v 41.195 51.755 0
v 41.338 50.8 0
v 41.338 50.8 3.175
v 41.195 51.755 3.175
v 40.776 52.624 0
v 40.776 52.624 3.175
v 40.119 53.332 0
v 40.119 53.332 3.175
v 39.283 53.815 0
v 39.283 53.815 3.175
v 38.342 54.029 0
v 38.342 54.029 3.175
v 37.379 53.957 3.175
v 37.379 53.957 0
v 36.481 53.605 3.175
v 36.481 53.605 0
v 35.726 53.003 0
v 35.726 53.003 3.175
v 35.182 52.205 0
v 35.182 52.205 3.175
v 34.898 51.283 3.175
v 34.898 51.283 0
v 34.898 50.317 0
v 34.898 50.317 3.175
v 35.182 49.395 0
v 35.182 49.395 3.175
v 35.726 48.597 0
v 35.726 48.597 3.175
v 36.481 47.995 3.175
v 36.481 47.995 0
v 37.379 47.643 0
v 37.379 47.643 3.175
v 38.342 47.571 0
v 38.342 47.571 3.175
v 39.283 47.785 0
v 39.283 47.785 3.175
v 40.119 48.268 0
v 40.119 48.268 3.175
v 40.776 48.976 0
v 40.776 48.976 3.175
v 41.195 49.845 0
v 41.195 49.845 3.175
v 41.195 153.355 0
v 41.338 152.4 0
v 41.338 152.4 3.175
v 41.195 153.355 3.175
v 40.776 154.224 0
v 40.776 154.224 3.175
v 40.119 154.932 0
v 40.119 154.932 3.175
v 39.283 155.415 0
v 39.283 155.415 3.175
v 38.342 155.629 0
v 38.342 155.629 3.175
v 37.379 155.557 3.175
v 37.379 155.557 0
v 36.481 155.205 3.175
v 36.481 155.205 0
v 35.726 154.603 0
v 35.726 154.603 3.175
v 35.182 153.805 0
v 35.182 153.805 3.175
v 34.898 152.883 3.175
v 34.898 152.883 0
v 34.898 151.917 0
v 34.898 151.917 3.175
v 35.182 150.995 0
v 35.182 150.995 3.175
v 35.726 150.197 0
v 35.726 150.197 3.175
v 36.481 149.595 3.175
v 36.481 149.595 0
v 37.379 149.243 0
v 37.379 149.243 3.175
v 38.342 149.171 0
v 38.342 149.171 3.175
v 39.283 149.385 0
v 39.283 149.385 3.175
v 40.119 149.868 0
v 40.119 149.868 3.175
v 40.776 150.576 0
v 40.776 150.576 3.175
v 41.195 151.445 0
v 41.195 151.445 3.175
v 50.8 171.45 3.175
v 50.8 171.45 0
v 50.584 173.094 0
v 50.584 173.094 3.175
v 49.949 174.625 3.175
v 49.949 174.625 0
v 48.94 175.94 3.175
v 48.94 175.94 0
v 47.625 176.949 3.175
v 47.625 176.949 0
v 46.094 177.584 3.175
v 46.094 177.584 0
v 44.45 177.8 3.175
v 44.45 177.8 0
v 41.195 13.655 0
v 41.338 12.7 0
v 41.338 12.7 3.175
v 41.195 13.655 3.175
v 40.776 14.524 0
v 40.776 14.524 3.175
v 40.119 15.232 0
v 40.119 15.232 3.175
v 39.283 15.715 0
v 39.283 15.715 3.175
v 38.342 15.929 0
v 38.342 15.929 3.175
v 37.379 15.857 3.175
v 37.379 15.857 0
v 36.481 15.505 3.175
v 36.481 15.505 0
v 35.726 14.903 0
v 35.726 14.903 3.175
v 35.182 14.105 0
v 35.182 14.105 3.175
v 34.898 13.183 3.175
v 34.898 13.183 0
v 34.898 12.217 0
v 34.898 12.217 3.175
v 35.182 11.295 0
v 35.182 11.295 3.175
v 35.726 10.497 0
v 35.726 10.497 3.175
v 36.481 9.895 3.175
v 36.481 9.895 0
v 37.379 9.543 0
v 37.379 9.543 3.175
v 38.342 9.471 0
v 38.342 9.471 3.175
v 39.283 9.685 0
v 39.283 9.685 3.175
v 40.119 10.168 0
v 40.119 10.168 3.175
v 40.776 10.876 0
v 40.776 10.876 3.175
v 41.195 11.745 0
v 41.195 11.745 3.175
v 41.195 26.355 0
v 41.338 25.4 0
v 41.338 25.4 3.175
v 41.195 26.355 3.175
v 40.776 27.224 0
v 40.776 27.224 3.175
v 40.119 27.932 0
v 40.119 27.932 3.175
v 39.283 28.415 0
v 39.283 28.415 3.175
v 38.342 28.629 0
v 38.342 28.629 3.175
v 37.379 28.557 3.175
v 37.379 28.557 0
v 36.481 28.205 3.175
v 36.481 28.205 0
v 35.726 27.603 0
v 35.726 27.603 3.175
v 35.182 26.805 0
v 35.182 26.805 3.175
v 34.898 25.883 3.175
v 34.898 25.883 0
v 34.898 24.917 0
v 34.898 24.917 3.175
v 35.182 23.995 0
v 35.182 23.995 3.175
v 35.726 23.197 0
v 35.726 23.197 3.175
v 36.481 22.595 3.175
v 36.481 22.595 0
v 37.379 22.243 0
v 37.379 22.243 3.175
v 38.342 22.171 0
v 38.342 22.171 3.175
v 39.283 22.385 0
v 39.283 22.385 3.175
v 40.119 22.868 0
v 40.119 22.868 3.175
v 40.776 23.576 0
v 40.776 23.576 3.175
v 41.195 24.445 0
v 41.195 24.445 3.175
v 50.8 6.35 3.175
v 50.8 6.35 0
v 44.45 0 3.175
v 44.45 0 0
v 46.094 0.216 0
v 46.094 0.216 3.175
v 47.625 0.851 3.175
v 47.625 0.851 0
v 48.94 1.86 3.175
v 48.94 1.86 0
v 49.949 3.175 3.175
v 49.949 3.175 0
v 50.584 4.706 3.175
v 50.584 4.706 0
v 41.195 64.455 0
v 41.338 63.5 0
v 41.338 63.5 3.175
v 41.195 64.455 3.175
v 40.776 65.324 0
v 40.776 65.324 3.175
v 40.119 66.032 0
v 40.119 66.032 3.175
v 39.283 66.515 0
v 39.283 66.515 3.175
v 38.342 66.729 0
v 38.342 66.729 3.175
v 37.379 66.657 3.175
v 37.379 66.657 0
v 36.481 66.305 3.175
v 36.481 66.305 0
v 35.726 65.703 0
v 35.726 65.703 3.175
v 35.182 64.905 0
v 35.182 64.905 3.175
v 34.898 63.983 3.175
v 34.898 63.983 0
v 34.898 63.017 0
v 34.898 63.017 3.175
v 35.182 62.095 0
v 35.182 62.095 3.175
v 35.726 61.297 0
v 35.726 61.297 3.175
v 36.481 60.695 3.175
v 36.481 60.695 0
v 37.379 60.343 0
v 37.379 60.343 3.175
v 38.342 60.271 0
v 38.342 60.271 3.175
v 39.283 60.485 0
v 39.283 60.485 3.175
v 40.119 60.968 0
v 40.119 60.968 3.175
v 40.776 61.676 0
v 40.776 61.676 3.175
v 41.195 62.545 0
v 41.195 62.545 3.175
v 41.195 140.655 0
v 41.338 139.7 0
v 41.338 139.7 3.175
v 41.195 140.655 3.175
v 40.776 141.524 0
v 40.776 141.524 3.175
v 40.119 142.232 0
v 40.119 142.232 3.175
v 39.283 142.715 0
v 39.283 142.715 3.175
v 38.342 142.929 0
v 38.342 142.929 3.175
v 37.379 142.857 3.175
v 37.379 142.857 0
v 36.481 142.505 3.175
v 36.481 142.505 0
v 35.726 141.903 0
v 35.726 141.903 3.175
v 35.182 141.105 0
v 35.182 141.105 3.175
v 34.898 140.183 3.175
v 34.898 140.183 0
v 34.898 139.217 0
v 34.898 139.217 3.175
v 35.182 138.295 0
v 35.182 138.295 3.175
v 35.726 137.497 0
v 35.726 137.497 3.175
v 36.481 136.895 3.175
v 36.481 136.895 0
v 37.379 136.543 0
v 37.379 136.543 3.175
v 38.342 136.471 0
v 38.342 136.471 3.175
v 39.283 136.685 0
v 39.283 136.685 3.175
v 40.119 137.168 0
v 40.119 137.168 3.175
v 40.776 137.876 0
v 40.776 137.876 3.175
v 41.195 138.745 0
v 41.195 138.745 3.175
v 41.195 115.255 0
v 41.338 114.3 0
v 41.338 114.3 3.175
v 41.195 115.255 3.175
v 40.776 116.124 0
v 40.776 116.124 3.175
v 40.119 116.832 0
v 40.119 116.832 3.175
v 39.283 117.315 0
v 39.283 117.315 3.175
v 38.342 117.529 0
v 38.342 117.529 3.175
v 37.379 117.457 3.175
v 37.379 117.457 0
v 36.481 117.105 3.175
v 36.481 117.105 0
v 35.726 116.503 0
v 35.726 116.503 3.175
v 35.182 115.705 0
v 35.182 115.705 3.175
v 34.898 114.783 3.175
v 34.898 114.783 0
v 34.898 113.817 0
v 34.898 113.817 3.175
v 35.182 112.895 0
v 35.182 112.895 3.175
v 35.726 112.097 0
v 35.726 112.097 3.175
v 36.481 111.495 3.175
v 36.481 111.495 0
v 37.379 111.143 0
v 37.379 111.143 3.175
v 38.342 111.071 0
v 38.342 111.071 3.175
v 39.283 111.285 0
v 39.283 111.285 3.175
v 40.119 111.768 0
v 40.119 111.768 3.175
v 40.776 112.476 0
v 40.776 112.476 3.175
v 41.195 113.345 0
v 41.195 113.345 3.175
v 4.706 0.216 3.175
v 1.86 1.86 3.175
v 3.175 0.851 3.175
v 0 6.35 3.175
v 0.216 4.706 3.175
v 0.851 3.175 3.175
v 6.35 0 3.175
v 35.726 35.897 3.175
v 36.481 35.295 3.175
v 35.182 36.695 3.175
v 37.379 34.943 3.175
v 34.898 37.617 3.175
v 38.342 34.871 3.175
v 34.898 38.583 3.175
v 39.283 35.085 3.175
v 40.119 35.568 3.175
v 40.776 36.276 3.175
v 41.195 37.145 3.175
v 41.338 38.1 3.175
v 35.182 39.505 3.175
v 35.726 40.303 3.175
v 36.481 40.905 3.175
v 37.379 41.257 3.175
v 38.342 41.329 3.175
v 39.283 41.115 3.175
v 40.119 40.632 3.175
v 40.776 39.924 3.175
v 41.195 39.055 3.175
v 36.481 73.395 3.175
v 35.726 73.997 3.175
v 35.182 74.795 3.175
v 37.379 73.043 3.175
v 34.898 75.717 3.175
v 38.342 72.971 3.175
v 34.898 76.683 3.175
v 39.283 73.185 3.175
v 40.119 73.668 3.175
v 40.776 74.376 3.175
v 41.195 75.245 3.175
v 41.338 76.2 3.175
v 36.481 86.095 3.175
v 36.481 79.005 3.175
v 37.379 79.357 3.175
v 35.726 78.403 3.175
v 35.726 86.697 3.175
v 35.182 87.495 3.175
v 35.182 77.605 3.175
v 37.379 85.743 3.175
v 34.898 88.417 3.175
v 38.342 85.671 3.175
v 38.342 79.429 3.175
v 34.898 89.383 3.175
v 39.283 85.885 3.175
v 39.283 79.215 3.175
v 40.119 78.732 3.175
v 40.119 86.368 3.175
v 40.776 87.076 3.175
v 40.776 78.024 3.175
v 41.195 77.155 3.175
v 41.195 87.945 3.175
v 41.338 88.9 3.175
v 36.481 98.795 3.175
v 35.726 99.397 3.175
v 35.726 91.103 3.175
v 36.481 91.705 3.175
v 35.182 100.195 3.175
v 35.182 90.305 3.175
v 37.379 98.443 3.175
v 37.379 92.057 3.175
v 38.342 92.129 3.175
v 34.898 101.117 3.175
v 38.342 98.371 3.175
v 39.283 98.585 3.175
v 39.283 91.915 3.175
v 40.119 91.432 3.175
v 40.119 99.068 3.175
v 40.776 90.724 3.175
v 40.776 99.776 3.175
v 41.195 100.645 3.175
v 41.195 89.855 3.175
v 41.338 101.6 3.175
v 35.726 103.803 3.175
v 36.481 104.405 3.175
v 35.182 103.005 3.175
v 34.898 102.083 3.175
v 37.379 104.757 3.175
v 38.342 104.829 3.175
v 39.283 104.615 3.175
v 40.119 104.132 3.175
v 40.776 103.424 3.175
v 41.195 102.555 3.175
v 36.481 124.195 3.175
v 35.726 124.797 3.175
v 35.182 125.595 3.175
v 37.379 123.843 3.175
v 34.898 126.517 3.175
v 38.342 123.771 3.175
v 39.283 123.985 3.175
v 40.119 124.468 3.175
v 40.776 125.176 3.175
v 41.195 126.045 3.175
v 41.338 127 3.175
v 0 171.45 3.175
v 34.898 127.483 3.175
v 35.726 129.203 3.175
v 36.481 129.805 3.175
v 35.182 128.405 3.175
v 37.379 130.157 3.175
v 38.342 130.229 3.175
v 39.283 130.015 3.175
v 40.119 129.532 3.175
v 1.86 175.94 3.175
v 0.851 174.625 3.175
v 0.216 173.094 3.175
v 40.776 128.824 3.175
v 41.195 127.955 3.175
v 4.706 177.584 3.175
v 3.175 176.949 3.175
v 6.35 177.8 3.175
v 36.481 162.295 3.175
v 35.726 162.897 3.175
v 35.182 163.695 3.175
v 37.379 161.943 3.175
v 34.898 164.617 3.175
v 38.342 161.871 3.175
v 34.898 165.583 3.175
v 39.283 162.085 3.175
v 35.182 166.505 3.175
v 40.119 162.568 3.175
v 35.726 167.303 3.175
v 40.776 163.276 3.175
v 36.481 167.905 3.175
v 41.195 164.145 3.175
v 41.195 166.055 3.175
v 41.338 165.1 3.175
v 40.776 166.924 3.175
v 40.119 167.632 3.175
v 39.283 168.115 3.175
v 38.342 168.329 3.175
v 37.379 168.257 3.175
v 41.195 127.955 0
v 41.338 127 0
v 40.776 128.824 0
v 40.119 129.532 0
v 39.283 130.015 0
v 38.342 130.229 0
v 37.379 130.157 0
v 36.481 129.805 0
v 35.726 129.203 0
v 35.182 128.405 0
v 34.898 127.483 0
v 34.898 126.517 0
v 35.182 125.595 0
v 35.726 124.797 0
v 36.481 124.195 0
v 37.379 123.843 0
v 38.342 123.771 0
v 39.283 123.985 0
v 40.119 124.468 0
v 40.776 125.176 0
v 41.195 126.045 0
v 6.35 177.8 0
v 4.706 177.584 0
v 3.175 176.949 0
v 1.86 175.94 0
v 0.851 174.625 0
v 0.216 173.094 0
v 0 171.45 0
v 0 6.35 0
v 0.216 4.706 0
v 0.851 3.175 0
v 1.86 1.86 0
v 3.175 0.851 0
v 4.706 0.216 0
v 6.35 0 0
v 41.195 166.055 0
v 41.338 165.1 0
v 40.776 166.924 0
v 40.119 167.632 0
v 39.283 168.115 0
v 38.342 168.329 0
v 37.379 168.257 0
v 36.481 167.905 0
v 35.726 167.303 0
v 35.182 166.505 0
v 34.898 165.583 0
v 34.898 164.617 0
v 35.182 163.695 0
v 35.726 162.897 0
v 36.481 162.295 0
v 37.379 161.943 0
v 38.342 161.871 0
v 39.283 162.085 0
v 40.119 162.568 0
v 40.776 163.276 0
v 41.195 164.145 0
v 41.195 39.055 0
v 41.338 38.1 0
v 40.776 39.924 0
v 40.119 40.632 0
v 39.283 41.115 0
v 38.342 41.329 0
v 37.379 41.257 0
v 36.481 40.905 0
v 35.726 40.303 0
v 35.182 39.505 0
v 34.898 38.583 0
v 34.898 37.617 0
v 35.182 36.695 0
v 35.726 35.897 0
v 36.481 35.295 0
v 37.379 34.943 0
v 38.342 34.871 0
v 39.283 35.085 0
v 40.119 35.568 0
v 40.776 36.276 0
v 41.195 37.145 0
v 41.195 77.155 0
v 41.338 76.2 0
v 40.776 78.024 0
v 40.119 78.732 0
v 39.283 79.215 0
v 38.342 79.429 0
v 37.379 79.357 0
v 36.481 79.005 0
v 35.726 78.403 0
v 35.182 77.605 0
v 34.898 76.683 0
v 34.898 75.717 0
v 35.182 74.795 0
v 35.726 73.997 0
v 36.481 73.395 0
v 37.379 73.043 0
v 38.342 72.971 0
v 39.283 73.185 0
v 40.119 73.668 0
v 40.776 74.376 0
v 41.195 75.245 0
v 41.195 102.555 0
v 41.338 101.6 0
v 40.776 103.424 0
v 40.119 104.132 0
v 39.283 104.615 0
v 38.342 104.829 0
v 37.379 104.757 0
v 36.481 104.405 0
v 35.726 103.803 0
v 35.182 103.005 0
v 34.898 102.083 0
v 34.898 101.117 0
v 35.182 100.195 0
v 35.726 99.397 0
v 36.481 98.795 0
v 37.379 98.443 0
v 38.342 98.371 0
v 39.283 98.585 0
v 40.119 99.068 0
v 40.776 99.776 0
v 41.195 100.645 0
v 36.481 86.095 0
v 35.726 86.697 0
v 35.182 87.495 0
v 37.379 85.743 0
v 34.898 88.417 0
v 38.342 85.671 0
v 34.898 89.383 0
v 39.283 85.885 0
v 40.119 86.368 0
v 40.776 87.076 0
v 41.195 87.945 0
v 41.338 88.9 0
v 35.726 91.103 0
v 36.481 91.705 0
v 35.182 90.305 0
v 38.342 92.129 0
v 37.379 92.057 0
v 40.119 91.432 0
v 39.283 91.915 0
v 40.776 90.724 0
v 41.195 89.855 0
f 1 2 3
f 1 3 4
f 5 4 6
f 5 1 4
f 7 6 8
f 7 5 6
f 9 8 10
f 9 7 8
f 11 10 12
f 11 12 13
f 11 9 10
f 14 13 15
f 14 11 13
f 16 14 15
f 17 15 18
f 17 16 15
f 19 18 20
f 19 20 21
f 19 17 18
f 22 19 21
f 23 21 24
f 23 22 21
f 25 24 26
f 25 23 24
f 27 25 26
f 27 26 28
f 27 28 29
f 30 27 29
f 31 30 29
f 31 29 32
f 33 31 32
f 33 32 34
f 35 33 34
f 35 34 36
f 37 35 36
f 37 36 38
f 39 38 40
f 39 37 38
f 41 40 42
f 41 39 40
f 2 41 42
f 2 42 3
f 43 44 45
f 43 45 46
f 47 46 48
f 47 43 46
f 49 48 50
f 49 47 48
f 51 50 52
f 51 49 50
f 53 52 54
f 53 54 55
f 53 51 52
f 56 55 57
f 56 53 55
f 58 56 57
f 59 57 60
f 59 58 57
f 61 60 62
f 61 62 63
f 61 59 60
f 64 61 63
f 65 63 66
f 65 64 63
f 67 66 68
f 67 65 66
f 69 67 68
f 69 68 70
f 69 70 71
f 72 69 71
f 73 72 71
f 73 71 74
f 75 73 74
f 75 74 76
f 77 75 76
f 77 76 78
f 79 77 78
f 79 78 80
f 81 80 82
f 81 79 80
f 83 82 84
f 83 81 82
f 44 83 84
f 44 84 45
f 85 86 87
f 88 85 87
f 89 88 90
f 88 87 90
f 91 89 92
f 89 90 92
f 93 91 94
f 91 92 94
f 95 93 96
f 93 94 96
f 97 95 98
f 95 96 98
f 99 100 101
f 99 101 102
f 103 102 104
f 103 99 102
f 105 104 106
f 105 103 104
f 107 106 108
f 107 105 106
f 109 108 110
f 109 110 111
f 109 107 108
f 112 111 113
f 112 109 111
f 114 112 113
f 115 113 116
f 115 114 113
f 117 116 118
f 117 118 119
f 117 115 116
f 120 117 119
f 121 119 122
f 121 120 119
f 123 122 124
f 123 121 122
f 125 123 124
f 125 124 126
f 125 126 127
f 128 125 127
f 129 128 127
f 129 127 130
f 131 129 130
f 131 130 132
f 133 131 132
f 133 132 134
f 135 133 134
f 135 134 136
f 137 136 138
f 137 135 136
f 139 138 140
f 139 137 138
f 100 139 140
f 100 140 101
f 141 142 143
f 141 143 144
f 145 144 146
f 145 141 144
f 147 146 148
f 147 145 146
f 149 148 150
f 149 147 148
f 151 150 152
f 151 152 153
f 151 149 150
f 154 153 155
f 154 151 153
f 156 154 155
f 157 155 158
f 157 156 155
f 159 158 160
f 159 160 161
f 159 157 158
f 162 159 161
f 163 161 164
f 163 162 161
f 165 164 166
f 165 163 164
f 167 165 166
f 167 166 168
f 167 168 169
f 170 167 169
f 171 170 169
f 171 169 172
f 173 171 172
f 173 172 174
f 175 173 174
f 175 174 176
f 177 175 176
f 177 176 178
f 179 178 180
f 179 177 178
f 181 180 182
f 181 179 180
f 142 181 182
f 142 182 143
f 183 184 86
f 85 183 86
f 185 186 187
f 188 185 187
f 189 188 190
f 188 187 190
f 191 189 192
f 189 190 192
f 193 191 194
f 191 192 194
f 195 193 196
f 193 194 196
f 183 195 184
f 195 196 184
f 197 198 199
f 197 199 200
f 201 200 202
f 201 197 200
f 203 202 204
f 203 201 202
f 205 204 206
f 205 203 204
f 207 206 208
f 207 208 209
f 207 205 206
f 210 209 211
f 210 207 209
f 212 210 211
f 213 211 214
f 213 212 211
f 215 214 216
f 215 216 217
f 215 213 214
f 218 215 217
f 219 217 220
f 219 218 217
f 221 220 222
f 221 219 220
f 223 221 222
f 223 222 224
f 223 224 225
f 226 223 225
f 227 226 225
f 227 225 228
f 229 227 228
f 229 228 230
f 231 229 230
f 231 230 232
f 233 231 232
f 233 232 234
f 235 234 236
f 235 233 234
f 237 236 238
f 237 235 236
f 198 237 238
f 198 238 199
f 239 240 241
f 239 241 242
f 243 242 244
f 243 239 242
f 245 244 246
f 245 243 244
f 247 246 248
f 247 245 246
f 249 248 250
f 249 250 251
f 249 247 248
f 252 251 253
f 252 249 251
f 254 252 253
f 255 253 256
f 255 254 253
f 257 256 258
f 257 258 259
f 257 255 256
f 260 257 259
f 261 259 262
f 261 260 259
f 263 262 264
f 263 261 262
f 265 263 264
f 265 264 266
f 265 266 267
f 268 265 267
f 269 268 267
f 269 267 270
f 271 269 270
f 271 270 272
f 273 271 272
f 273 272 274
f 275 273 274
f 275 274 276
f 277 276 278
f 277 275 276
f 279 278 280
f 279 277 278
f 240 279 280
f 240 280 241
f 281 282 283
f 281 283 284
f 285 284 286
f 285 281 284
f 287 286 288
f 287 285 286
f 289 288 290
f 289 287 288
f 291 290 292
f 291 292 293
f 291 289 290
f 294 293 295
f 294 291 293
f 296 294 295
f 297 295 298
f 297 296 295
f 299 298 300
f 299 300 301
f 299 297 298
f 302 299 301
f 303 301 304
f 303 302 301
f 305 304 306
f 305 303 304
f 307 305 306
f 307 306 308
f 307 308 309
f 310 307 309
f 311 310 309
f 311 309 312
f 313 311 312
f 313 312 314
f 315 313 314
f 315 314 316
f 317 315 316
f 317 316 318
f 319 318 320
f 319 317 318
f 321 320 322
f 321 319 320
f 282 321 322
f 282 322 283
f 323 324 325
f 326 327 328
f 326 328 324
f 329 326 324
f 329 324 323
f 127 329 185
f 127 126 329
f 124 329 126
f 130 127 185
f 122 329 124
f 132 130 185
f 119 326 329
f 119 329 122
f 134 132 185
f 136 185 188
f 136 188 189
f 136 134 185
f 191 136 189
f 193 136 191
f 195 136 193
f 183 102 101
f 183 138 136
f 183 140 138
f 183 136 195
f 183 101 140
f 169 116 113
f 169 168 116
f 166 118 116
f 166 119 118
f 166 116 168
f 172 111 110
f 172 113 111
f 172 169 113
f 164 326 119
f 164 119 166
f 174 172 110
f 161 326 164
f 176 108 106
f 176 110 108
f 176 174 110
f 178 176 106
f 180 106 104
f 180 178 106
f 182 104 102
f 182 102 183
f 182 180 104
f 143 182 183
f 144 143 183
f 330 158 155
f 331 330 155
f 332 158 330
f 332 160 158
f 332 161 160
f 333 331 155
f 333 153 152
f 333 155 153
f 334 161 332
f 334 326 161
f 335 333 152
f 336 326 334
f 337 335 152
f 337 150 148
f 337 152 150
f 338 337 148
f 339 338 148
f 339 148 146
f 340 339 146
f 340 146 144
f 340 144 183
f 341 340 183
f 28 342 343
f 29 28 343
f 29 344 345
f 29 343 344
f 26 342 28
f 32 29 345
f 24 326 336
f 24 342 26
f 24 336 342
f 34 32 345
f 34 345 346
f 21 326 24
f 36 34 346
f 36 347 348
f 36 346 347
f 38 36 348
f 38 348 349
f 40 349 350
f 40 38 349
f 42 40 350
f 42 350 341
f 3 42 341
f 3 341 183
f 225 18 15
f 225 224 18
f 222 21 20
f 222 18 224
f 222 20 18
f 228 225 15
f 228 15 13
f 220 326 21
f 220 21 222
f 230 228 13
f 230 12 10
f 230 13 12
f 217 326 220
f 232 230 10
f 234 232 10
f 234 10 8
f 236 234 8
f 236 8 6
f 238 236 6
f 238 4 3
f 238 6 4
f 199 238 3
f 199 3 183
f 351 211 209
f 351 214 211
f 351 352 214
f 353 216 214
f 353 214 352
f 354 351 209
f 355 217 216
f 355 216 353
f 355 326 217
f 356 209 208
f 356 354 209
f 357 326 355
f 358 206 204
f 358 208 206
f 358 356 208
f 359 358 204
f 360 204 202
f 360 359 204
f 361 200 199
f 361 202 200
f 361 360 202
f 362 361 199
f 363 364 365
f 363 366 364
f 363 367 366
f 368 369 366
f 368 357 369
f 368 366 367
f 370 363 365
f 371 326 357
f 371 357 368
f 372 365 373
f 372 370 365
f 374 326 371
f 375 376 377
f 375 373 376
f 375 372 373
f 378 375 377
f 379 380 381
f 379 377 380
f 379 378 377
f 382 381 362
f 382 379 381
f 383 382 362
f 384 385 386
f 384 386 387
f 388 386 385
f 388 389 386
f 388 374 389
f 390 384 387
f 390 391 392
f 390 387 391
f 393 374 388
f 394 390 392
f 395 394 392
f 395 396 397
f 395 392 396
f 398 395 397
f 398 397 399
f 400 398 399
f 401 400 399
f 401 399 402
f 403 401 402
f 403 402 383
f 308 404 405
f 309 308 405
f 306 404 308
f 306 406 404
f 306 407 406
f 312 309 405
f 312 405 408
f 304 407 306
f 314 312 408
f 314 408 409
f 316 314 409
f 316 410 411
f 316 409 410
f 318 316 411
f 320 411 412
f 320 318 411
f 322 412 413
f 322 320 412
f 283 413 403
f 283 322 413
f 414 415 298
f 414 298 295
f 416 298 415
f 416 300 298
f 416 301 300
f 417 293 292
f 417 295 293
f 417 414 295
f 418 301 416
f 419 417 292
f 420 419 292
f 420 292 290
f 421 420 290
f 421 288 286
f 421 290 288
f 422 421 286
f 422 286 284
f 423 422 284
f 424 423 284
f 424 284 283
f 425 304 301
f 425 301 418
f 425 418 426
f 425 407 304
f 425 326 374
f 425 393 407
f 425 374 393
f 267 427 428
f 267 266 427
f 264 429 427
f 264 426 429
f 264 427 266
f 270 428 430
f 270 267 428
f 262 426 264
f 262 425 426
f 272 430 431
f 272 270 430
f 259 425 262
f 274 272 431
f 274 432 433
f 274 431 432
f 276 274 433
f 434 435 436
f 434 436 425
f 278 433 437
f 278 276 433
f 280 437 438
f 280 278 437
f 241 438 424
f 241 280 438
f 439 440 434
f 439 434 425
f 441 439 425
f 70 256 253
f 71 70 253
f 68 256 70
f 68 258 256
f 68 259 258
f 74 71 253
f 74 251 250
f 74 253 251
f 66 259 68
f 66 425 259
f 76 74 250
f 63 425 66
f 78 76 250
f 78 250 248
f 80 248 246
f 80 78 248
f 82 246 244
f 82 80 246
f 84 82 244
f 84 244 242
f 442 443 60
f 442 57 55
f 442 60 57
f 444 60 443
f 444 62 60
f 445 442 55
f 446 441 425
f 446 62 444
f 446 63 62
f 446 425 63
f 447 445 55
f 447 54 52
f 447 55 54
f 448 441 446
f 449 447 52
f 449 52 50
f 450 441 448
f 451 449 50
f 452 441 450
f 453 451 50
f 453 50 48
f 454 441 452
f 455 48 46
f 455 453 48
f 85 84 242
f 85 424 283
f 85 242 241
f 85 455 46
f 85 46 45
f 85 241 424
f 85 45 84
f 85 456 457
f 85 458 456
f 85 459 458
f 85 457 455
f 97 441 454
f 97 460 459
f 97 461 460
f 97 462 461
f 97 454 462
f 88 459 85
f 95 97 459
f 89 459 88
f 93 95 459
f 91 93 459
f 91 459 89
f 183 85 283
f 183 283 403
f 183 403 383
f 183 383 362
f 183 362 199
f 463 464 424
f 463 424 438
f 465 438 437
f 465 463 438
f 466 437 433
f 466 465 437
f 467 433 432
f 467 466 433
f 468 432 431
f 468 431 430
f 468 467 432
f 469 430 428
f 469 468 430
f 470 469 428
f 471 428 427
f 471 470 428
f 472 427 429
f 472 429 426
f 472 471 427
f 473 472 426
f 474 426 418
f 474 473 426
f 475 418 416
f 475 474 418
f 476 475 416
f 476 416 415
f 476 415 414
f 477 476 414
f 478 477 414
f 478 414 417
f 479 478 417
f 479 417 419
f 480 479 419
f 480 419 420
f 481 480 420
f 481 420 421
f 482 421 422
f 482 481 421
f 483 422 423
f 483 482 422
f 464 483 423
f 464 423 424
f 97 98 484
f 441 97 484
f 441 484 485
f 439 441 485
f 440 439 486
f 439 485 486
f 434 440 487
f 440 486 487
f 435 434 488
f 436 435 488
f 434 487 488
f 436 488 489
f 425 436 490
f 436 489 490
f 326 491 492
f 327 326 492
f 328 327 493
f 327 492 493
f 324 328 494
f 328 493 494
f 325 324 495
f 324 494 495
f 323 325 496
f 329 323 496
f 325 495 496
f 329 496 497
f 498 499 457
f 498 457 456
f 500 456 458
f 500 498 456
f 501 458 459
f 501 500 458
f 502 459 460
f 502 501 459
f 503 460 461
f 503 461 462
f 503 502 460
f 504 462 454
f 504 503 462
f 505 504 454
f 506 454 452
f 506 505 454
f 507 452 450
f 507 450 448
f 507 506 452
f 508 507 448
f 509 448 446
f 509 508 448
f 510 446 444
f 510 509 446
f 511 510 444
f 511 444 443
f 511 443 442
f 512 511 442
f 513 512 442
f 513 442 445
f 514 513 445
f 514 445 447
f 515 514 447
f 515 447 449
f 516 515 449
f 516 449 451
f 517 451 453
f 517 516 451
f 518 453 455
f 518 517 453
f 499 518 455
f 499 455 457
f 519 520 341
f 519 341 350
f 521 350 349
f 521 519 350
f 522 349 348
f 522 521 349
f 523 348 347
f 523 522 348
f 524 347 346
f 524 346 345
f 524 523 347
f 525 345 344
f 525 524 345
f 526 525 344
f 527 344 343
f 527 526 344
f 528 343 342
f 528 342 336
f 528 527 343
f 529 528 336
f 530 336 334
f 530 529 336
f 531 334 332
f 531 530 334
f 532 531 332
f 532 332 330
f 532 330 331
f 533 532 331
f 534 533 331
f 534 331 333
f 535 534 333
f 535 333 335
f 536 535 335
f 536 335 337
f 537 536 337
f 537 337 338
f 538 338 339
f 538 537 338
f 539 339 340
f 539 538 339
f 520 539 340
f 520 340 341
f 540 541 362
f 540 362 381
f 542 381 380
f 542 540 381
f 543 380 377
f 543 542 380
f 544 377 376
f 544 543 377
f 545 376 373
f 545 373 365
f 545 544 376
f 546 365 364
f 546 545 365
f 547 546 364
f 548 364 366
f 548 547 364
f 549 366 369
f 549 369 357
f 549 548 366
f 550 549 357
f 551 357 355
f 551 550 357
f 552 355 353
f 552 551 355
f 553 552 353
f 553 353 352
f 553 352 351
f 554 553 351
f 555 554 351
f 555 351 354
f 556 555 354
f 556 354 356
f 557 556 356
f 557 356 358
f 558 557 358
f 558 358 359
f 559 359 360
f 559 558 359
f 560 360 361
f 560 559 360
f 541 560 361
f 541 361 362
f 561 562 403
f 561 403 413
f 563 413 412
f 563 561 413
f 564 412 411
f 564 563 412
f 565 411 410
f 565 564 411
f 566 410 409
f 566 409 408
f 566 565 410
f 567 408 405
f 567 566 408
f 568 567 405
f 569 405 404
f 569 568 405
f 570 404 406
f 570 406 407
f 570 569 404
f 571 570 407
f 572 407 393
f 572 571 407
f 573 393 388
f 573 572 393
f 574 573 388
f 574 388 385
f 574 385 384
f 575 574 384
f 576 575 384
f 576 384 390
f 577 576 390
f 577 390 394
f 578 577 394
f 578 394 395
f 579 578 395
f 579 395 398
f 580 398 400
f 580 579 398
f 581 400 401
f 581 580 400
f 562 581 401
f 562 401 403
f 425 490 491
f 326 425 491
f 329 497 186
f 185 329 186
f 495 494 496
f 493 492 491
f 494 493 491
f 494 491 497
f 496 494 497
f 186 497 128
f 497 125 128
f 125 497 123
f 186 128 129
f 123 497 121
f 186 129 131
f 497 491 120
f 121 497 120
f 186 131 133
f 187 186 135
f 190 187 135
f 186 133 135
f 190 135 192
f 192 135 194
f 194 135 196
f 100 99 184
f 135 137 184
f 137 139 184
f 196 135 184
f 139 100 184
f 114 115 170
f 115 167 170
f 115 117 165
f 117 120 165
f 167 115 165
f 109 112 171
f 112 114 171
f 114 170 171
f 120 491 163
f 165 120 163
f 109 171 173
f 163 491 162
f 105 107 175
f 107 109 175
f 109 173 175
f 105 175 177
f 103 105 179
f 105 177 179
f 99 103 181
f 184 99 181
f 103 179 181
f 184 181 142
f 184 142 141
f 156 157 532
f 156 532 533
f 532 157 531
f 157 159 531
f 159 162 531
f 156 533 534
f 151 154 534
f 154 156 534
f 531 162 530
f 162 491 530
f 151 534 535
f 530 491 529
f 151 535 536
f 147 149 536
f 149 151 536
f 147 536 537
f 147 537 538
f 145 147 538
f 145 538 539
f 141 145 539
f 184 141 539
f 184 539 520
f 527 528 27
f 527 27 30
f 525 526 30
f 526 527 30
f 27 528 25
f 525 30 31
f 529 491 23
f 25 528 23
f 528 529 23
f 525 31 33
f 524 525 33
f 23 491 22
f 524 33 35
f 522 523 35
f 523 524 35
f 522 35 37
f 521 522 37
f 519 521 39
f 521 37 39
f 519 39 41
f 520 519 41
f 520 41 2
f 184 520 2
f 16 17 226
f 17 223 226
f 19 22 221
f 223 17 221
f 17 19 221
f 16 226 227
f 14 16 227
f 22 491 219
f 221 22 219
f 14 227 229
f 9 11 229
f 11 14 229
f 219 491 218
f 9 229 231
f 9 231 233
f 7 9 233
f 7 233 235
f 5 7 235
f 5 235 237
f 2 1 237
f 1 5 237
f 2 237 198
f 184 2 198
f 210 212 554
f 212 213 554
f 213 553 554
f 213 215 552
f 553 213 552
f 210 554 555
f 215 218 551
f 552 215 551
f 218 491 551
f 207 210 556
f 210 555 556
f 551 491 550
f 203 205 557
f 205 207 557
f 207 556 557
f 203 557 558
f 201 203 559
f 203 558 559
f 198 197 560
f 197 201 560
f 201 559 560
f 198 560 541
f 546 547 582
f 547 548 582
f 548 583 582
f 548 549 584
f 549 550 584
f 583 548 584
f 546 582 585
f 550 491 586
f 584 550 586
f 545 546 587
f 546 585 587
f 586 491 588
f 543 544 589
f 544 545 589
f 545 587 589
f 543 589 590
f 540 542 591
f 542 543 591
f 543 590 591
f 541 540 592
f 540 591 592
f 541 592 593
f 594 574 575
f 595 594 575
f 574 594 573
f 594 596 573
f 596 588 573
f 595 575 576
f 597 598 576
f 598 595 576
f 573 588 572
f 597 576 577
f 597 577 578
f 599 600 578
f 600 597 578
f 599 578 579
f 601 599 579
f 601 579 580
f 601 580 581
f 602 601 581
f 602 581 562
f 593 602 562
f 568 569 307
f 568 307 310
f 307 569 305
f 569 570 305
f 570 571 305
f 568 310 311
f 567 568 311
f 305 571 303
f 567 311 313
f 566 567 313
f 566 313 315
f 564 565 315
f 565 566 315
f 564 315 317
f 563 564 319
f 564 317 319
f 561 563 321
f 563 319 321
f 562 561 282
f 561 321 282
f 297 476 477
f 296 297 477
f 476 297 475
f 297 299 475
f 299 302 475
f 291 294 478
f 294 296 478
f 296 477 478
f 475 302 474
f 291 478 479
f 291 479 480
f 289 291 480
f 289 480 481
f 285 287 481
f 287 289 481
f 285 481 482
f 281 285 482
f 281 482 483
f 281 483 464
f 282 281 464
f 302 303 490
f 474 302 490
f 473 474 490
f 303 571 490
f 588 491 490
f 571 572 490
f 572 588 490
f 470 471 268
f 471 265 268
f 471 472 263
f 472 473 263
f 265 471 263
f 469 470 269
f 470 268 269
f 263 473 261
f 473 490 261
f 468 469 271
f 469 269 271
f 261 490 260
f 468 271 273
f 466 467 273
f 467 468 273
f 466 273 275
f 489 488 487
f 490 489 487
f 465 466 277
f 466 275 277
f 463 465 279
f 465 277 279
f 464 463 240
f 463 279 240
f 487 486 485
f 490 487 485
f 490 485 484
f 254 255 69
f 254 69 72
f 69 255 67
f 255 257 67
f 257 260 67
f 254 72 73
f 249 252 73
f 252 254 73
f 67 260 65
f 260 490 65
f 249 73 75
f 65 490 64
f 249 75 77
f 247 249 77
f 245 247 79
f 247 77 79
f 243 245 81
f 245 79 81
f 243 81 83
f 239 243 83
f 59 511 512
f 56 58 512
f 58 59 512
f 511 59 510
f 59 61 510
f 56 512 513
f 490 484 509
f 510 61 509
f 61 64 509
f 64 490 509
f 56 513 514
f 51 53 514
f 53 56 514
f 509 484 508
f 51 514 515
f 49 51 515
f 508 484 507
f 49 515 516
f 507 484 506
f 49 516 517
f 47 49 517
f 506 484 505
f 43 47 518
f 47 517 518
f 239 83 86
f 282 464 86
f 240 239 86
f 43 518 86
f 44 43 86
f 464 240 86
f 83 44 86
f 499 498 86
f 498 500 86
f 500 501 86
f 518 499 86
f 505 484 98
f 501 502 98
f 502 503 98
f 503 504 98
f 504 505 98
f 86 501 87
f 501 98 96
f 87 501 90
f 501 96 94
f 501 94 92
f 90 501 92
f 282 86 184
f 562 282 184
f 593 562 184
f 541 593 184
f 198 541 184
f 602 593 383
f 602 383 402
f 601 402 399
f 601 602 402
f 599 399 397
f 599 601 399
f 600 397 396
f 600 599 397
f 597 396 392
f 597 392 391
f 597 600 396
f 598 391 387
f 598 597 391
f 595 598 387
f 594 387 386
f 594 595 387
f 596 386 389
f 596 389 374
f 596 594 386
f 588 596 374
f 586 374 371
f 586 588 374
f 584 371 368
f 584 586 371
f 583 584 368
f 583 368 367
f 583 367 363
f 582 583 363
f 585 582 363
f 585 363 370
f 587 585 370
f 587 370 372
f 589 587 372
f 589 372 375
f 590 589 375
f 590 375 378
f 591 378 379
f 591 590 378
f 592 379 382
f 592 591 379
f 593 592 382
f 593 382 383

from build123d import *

# Parameters (mm, degrees)
F0_R     = 3.2385
F1_DEPTH = 3.175


with BuildPart() as f1:
    # F0 (on Top) → F1 (new body)
    with BuildSketch(Plane.XY):
        with BuildLine():
            ThreePointArc((0, 6.35), (1.859872, 1.859872), (6.35, 0))
            Line((6.35, 0), (44.45, 0))
            ThreePointArc((44.45, 0), (48.940128, 1.859872), (50.8, 6.35))
            Line((50.8, 6.35), (50.8, 171.45))
            ThreePointArc((50.8, 171.45), (48.940128, 175.940128), (44.45, 177.8))
            Line((44.45, 177.8), (6.35, 177.8))
            ThreePointArc((6.35, 177.8), (1.859872, 175.940128), (0, 171.45))
            Line((0, 171.45), (0, 6.35))
        make_face()
        with Locations((38.1, 12.7)):
            Circle(F0_R, mode=Mode.SUBTRACT)
        with Locations((38.1, 25.4)):
            Circle(F0_R, mode=Mode.SUBTRACT)
        with Locations((38.1, 38.1)):
            Circle(F0_R, mode=Mode.SUBTRACT)
        with Locations((38.1, 50.8)):
            Circle(F0_R, mode=Mode.SUBTRACT)
        with Locations((38.1, 63.5)):
            Circle(F0_R, mode=Mode.SUBTRACT)
        with Locations((38.1, 76.2)):
            Circle(F0_R, mode=Mode.SUBTRACT)
        with Locations((38.1, 88.9)):
            Circle(F0_R, mode=Mode.SUBTRACT)
        with Locations((38.1, 101.6)):
            Circle(F0_R, mode=Mode.SUBTRACT)
        with Locations((38.1, 114.3)):
            Circle(F0_R, mode=Mode.SUBTRACT)
        with Locations((38.1, 127)):
            Circle(F0_R, mode=Mode.SUBTRACT)
        with Locations((38.1, 139.7)):
            Circle(F0_R, mode=Mode.SUBTRACT)
        with Locations((38.1, 152.4)):
            Circle(F0_R, mode=Mode.SUBTRACT)
        with Locations((38.1, 165.1)):
            Circle(F0_R, mode=Mode.SUBTRACT)
    extrude(amount=F1_DEPTH)


solid = f1.part
